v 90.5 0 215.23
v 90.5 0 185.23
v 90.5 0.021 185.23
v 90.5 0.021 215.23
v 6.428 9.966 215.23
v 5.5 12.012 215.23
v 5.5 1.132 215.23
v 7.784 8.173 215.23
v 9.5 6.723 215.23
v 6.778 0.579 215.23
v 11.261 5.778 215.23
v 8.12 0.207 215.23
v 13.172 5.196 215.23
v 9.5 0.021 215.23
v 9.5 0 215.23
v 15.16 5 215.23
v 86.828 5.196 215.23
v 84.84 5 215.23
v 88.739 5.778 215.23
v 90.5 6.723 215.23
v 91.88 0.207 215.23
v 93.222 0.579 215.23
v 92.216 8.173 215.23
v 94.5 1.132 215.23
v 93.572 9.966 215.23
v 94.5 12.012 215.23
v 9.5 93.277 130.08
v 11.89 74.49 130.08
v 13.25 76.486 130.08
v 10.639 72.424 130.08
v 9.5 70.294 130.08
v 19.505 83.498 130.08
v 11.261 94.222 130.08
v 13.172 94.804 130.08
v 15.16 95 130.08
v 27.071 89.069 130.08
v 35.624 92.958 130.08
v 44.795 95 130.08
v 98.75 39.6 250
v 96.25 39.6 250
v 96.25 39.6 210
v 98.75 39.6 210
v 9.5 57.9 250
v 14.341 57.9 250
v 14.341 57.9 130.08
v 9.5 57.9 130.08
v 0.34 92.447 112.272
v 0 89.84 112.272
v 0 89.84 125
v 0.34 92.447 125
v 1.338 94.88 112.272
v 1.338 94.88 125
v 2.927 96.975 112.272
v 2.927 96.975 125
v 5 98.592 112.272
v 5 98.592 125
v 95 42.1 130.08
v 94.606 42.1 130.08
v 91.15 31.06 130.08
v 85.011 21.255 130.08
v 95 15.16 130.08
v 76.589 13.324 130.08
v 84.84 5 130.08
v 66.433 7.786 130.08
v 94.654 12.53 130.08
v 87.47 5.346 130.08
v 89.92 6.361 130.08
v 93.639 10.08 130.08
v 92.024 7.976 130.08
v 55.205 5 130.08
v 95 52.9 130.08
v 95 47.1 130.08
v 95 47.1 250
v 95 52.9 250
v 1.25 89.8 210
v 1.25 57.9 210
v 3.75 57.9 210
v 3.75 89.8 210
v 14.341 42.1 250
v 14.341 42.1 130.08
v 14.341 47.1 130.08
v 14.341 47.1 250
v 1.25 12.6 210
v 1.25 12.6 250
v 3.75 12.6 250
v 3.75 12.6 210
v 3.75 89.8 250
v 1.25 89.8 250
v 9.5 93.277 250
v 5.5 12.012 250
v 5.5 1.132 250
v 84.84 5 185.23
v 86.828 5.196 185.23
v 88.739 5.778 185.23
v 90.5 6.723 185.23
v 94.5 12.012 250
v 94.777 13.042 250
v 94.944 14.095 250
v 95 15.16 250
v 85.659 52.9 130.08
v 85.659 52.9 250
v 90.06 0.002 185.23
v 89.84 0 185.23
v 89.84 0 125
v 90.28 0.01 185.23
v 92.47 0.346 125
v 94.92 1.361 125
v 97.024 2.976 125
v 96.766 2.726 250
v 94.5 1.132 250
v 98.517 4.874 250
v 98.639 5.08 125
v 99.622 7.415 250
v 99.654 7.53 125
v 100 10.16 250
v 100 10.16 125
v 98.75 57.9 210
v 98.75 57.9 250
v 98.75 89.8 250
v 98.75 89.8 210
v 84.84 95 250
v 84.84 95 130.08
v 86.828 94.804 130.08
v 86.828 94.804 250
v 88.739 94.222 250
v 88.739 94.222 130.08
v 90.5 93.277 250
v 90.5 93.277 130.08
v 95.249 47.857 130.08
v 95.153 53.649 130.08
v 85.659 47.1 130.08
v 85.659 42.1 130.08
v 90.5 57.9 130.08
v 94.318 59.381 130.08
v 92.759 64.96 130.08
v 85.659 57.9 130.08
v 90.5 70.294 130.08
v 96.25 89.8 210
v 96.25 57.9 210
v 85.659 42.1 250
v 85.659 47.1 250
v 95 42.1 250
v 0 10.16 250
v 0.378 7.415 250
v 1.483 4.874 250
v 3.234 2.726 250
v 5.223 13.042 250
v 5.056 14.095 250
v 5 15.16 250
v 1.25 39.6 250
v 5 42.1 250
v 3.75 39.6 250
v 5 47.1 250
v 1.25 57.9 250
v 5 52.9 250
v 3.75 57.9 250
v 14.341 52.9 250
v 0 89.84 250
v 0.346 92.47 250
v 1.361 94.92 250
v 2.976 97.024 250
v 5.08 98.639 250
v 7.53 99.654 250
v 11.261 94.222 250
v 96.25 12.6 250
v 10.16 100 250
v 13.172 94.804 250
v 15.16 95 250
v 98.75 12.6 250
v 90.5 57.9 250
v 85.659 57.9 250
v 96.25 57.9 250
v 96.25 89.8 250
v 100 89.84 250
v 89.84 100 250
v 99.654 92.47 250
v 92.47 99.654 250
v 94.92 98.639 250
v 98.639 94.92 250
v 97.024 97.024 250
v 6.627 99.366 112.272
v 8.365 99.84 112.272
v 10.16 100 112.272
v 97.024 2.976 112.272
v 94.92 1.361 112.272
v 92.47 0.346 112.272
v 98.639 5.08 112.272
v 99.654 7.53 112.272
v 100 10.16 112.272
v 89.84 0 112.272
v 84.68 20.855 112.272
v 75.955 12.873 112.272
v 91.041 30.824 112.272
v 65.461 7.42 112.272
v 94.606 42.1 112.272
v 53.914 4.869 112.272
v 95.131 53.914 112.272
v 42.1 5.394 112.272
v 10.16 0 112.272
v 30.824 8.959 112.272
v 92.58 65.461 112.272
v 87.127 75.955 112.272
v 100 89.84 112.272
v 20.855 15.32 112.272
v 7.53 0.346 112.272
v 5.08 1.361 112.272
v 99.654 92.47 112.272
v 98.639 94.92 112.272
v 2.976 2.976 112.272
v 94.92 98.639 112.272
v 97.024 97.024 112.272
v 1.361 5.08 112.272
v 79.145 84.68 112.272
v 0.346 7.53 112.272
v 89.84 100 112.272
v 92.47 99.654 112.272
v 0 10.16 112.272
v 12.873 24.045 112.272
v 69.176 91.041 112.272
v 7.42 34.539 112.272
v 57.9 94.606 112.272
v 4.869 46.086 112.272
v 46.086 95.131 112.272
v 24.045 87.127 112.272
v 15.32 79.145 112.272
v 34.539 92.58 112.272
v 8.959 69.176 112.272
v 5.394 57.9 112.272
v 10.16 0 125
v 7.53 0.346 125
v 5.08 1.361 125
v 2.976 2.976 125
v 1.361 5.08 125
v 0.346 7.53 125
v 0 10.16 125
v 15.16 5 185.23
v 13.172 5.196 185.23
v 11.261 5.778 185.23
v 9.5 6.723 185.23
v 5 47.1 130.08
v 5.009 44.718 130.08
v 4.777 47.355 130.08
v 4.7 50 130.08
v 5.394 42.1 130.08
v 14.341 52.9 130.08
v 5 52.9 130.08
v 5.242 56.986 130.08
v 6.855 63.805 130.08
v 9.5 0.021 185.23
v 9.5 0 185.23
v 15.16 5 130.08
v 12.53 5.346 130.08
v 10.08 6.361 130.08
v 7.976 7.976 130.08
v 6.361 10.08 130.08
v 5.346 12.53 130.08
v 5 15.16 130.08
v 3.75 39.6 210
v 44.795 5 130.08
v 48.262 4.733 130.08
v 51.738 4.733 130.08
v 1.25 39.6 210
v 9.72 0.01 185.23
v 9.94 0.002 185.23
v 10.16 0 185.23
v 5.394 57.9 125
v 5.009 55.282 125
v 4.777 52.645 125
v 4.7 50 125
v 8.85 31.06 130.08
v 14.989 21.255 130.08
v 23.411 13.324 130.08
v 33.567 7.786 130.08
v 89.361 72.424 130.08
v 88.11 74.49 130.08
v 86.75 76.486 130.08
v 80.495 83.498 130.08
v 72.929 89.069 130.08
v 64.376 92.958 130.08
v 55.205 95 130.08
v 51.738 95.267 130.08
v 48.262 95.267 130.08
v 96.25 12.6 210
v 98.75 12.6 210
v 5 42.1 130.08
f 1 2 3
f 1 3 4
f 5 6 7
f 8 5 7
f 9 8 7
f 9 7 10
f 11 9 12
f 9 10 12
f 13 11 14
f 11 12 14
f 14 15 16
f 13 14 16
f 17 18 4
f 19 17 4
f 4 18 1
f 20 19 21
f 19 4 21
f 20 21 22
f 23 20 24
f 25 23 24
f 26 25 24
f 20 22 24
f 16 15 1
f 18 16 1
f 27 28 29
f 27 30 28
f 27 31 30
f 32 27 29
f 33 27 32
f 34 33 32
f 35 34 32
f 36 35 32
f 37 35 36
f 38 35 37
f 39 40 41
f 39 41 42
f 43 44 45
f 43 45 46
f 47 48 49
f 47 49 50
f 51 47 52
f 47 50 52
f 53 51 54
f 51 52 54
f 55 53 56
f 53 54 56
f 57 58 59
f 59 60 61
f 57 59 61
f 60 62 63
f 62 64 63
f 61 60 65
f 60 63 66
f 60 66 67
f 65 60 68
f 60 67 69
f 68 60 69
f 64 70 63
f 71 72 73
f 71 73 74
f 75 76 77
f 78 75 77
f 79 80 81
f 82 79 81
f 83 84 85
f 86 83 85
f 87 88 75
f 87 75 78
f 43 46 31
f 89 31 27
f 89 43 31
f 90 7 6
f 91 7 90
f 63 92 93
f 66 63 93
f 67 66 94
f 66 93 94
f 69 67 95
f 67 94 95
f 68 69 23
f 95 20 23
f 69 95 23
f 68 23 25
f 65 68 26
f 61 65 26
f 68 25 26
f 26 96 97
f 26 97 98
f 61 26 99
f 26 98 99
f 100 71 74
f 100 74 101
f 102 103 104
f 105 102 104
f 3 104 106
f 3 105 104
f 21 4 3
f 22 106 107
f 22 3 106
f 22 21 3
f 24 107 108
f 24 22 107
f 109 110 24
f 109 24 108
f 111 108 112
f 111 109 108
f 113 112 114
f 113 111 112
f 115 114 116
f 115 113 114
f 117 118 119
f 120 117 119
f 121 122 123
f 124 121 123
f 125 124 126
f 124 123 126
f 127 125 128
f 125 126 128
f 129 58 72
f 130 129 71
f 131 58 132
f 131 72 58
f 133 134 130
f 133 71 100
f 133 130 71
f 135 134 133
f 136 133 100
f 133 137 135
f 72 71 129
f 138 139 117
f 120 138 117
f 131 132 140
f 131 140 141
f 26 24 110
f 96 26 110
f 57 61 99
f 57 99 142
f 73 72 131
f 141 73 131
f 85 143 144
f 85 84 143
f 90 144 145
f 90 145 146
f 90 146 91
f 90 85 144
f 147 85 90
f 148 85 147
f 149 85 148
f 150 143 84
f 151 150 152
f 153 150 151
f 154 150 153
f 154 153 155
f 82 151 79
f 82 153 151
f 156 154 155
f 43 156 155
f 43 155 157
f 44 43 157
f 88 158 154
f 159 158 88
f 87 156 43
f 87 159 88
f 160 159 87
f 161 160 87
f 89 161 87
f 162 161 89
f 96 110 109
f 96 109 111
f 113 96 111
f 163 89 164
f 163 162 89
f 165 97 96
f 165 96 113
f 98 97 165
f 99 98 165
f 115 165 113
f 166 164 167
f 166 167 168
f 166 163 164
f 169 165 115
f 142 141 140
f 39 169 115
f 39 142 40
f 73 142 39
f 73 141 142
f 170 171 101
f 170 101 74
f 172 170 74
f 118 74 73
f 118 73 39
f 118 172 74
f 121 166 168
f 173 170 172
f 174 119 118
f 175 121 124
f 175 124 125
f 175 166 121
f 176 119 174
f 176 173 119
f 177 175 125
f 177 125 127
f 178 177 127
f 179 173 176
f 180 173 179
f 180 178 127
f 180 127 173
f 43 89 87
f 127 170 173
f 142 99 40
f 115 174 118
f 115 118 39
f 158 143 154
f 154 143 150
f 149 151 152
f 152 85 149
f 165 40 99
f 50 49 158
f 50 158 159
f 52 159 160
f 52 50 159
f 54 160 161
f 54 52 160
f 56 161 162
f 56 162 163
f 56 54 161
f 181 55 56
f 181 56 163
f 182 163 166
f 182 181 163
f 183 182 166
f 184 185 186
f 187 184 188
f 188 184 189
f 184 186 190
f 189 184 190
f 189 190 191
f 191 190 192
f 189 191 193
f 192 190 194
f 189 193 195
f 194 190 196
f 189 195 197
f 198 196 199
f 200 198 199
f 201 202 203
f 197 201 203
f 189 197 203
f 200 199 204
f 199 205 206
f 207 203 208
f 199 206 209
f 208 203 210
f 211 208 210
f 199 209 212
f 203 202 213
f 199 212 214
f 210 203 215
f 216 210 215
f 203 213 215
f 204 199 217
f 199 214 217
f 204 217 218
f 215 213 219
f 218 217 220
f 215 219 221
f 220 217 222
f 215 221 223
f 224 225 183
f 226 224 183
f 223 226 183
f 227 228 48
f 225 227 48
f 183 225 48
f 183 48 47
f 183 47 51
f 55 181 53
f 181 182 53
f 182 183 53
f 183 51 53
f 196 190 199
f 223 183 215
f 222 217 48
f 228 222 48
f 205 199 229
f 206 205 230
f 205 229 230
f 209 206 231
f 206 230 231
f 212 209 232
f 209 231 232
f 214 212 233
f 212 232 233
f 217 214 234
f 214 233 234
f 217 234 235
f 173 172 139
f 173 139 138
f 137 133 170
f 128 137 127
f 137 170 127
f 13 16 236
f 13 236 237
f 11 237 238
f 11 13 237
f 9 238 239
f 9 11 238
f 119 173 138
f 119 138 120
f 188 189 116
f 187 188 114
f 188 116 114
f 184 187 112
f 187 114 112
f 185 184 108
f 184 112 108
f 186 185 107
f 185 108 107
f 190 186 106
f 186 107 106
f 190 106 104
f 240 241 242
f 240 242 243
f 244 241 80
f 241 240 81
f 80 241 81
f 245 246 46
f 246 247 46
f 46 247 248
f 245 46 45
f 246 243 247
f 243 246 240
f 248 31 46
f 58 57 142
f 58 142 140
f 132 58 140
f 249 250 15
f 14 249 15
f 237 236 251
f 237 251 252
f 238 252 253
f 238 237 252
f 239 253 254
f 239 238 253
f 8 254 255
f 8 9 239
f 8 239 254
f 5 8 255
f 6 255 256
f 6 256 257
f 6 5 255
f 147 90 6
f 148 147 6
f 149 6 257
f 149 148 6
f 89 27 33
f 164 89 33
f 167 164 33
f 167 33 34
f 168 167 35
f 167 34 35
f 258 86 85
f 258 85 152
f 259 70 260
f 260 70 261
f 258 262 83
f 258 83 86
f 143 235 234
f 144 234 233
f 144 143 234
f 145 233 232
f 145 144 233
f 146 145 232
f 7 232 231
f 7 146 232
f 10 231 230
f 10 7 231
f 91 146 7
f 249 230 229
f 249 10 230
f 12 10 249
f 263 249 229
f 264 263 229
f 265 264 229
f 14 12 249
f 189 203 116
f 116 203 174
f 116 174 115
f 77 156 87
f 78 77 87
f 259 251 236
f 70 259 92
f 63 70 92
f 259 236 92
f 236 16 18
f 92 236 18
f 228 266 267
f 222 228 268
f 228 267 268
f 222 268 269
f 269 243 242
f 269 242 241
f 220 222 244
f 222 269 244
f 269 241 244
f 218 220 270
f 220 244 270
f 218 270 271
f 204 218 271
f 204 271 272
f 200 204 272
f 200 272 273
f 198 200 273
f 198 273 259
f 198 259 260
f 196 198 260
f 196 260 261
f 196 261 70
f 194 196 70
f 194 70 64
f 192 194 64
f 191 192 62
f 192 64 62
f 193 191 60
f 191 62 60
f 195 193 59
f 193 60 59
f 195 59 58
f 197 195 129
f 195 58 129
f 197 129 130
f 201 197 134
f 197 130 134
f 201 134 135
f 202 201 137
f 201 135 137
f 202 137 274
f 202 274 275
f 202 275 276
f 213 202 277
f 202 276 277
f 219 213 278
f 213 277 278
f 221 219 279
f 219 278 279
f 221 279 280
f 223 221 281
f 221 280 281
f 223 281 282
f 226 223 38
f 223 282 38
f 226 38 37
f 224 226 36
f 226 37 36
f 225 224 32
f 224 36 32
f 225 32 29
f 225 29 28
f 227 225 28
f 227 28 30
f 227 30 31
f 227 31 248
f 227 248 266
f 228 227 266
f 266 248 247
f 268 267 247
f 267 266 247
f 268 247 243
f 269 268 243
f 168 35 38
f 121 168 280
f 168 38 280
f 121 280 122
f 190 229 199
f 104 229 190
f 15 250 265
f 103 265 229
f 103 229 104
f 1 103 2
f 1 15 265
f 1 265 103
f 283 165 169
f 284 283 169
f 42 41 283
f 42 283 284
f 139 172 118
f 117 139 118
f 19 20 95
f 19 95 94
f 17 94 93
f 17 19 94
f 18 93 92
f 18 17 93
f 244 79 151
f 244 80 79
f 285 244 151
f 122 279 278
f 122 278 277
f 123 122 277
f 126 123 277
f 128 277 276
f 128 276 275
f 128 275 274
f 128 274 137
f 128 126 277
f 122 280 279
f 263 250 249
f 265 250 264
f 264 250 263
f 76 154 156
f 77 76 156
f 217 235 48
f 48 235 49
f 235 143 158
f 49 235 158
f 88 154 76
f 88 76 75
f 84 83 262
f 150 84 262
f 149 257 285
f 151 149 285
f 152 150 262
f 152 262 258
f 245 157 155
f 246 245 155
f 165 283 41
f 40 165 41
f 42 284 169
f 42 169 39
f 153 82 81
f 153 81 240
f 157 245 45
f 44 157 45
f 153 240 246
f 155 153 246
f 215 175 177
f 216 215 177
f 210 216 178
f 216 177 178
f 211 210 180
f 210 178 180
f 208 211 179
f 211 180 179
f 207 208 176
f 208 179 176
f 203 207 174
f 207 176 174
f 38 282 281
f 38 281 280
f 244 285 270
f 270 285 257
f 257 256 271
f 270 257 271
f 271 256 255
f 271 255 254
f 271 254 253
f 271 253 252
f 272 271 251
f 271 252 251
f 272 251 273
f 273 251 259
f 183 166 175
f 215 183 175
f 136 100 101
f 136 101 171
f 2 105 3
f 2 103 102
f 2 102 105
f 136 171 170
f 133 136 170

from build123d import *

# Parameters (mm, degrees)
SKETCH1_W                = 100
SKETCH1_H                = 100
BOSS_EXTRUDE1_DEPTH      = 250
SKETCH2_W                = 90
SKETCH2_H                = 90
CUT_EXTRUDE1_DEPTH       = 288.228132327
FILLET1_R                = 10.16
SKETCH3_W                = 9.3412
SKETCH3_H                = 5
BOSS_EXTRUDE2_DEPTH      = 250
SKETCH4_W                = 100
SKETCH4_H                = 125
CUT_EXTRUDE2_DEPTH       = 288.228132327
SKETCH6_W                = 90
SKETCH6_H                = 5.08
BOSS_EXTRUDE3_DEPTH      = 95
SKETCH7_R                = 45.3
CUT_EXTRUDE4_DEPTH       = 5.08
SKETCH10_R               = 48.300000047
BOSS_EXTRUDE4_DEPTH      = 30
SKETCH11_R               = 45.3
CUT_EXTRUDE5_DEPTH       = 30
SKETCH13_W               = 63.5
SKETCH13_H               = 63.5
CUT_EXTRUDE7_DEPTH       = 5
FILLET4_R                = 1.27
FILLET5_R                = 10.16
BOSS_EXTRUDE6_DEPTH      = 30
SKETCH16_R               = 45.3
CUT_EXTRUDE8_DEPTH       = 189.745860882
CUT_EXTRUDE10_DEPTH      = 210.821352584
SKETCH19_W               = 81
SKETCH19_H               = 64.77
CUT_EXTRUDE11_DEPTH      = 25.4
SKETCH20_W               = 81
SKETCH20_H               = 32.5
BOSS_EXTRUDE7_DEPTH      = 5
BOSS_EXTRUDE8_START      = 32.5
BOSS_EXTRUDE8_DEPTH      = 32.5
BOSS_EXTRUDE10_DEPTH     = 119.92
SKETCH25_W               = 73.5
SKETCH25_H               = 16.413635584
BOSS_EXTRUDE11_DEPTH     = 6.35
SKETCH26_W               = 17.272
SKETCH26_H               = 100
CUT_EXTRUDE12_DEPTH      = 132
SKETCH28_W               = 81
SKETCH28_H               = 37.9
CUT_EXTRUDE13_DEPTH      = 113.57
SKETCH29_W               = 2.5
SKETCH29_H               = 31.9
SKETCH29_H_2             = 27
CUT_EXTRUDE14_DEPTH      = 40
CUT_EXTRUDE15_DEPTH      = 198.405678703
CUT_EXTRUDE15_DEPTH_BACK = 119.92
SKETCH30_W               = 90
SKETCH30_H               = 37.9
BOSS_EXTRUDE12_DEPTH     = 119.92
CUT_EXTRUDE16_REACH      = 289.228
SKETCH33_W               = 89
SKETCH33_H               = 34.77
SKETCH35_W               = 4.5
SKETCH35_H               = 38.1
BOSS_EXTRUDE14_DEPTH     = 119.92


with BuildPart() as part:
    # Sketch1 → Boss-Extrude1 (new body)
    with BuildSketch(Plane.XY):
        with Locations((50, 50)):
            Rectangle(SKETCH1_W, SKETCH1_H)
    extrude(amount=BOSS_EXTRUDE1_DEPTH)

    # Sketch2 → Cut-Extrude1 (cut, through all)
    with BuildSketch(Plane(origin=(0, 0, 0), x_dir=(-1, 0, 0), z_dir=(0, 0, -1))):
        with Locations((-50, 50)):
            Rectangle(SKETCH2_W, SKETCH2_H)
    extrude(amount=-CUT_EXTRUDE1_DEPTH, mode=Mode.SUBTRACT)

    # Fillet1
    fillet1_edges = [part.edges().sort_by_distance(p)[0] for p in [
        (0, 100, 125),
        (0, 0, 125),
        (100, 0, 125),
        (100, 100, 125),
    ]]
    fillet(fillet1_edges, radius=FILLET1_R)

    # Sketch3 → Boss-Extrude2 (add, through all)
    with BuildSketch(Plane(origin=(0, 0, 0), x_dir=(-1, 0, 0), z_dir=(0, 0, -1))):
        with Locations((-90.3294, 55.4)):
            Rectangle(SKETCH3_W, SKETCH3_H)
        with Locations((-90.3294, 44.6)):
            Rectangle(SKETCH3_W, SKETCH3_H)
        with Locations((-9.6706, 44.6)):
            Rectangle(SKETCH3_W, SKETCH3_H)
        with Locations((-9.6706, 55.4)):
            Rectangle(SKETCH3_W, SKETCH3_H)
    extrude(amount=-BOSS_EXTRUDE2_DEPTH)

    # Sketch4 → Cut-Extrude2 (cut, through all)
    with BuildSketch(Plane(origin=(0, 100, 0), x_dir=(1, 0, 0), z_dir=(0, 1, 0))):
        with Locations((50, -62.5)):
            Rectangle(SKETCH4_W, SKETCH4_H)
    extrude(amount=-CUT_EXTRUDE2_DEPTH, mode=Mode.SUBTRACT)

    # Sketch6 → Boss-Extrude3 (add)
    with BuildSketch(Plane(origin=(0, 5, 0), x_dir=(1, 0, 0), z_dir=(0, 1, 0))):
        with Locations((50, -127.54)):
            Rectangle(SKETCH6_W, SKETCH6_H)
    extrude(amount=BOSS_EXTRUDE3_DEPTH)

    # Sketch7 → Cut-Extrude4 (cut)
    with BuildSketch(Plane(origin=(0, 0, 125), x_dir=(-1, 0, 0), z_dir=(0, 0, -1))):
        with Locations((-50, 50)):
            Circle(SKETCH7_R)
    extrude(amount=-CUT_EXTRUDE4_DEPTH, mode=Mode.SUBTRACT)

    # Sketch10 → Boss-Extrude4 (add)
    with BuildSketch(Plane(origin=(0, 0, 125), x_dir=(-1, 0, 0), z_dir=(0, 0, -1))):
        with Locations(Location((-50, 50, 0), (0, 0, 180))):
            Circle(SKETCH10_R)
    extrude(amount=BOSS_EXTRUDE4_DEPTH)

    # Sketch11 → Cut-Extrude5 (cut)
    with BuildSketch(Plane(origin=(0, 0, 95), x_dir=(-1, 0, 0), z_dir=(0, 0, -1))):
        with Locations((-50, 50)):
            Circle(SKETCH11_R)
    extrude(amount=-CUT_EXTRUDE5_DEPTH, mode=Mode.SUBTRACT)

    # Sketch13 → Cut-Extrude7 (cut)
    with BuildSketch(Plane.XZ):
        with Locations((50, 218.25)):
            Rectangle(SKETCH13_W, SKETCH13_H)
    extrude(amount=-CUT_EXTRUDE7_DEPTH, mode=Mode.SUBTRACT)

    # Fillet4
    fillet4_edges = [part.edges().sort_by_distance(p)[0] for p in [
        (81.75, 0, 218.25),
        (18.25, 0, 218.25),
        (50, 0, 186.5),
    ]]
    fillet(fillet4_edges, radius=FILLET4_R)

    # Fillet5
    fillet5_edges = [part.edges().sort_by_distance(p)[0] for p in [
        (95, 95, 190.04),
        (5, 95, 190.04),
        (5, 5, 190.04),
        (95, 5, 190.04),
    ]]
    fillet(fillet5_edges, radius=FILLET5_R)

    # Sketch14 → Boss-Extrude6 (add)
    with BuildSketch(Plane(origin=(0, 0, 125), x_dir=(-1, 0, 0), z_dir=(0, 0, -1))):
        with BuildLine():
            Line((-5, 100), (-95, 100))
            Line((-95, 100), (-95, 98.592142595))
            ThreePointArc((-95, 98.592142595), (-98.661881885, 94.879841267), (-100, 89.84))
            Line((-100, 89.84), (-100, 10.16))
            ThreePointArc((-100, 10.16), (-97.024204897, 2.975795103), (-89.84, 0))
            Line((-89.84, 0), (-10.16, 0))
            ThreePointArc((-10.16, 0), (-2.975795103, 2.975795103), (0, 10.16))
            Line((0, 10.16), (0, 89.84))
            ThreePointArc((0, 89.84), (-1.338118115, 94.879841267), (-5, 98.592142595))
            Line((-5, 98.592142595), (-5, 100))
        make_face()
    extrude(amount=BOSS_EXTRUDE6_DEPTH)

    # Sketch16 → Cut-Extrude8 (cut, through all)
    with BuildSketch(Plane.XY.offset(125)):
        with Locations(Location((50, 50, 0), (0, 0, 169.956667322))):
            Circle(SKETCH16_R)
    extrude(amount=-CUT_EXTRUDE8_DEPTH, mode=Mode.SUBTRACT)

    # Sketch18 → Cut-Extrude10 (cut, through all)
    with BuildSketch(Plane(origin=(0, 0, 95), x_dir=(-1, 0, 0), z_dir=(0, 0, -1))):
        with BuildLine():
            Line((-100, 89.84), (-100, 107.62))
            Line((-100, 107.62), (0, 107.62))
            Line((0, 107.62), (0, 89.84))
            ThreePointArc((0, 89.84), (-2.975795103, 97.024204897), (-10.16, 100))
            Line((-10.16, 100), (-89.84, 100))
            ThreePointArc((-89.84, 100), (-97.024204897, 97.024204897), (-100, 89.84))
        make_face()
    extrude(amount=-CUT_EXTRUDE10_DEPTH, mode=Mode.SUBTRACT)

    # Sketch19 → Cut-Extrude11 (cut)
    with BuildSketch(Plane.XZ):
        with Locations((50, 217.615)):
            Rectangle(SKETCH19_W, SKETCH19_H)
    extrude(amount=-CUT_EXTRUDE11_DEPTH, mode=Mode.SUBTRACT)

    # Sketch20 → Boss-Extrude7 (add)
    with BuildSketch(Plane.XZ):
        with Locations((50, 201.48)):
            Rectangle(SKETCH20_W, SKETCH20_H)
    extrude(amount=-BOSS_EXTRUDE7_DEPTH)

    # Sketch21 → Boss-Extrude8 (add)
    with BuildSketch(Plane.XY.offset(185.23).offset(BOSS_EXTRUDE8_START)):
        with BuildLine():
            Line((9.5, 5), (15.16, 5))
            ThreePointArc((15.16, 5), (12.201837845, 5.440181243), (9.5, 6.722583334))
            Line((9.5, 6.722583334), (9.5, 5))
        make_face()
        with BuildLine():
            ThreePointArc((90.5, 6.722583334), (87.798162155, 5.440181243), (84.84, 5))
            Line((84.84, 5), (90.5, 5))
            Line((90.5, 5), (90.5, 6.722583334))
        make_face()
    extrude(amount=-BOSS_EXTRUDE8_DEPTH)

    # Sketch24 → Boss-Extrude10 (add)
    with BuildSketch(Plane.XY.offset(130.08)):
        Polygon((95, 57.9), (86.75, 57.9), (86.75, 92.9), (13.25, 92.9), (13.25, 57.9), (5, 57.9), (5, 95), (95, 95), align=None)
    extrude(amount=BOSS_EXTRUDE10_DEPTH)

    # Sketch25 → Boss-Extrude11 (add)
    with BuildSketch(Plane.XY.offset(130.08)):
        with Locations((50, 84.693182208)):
            Rectangle(SKETCH25_W, SKETCH25_H)
    extrude(amount=BOSS_EXTRUDE11_DEPTH)

    # Sketch26 → Cut-Extrude12 (cut)
    with BuildSketch(Plane.ZY):
        with Locations((103.636, 50)):
            Rectangle(SKETCH26_W, SKETCH26_H)
    extrude(amount=-CUT_EXTRUDE12_DEPTH, mode=Mode.SUBTRACT)

    # Sketch28 → Cut-Extrude13 (cut)
    with BuildSketch(Plane.XY.offset(250)):
        with Locations((50, 76.85)):
            Rectangle(SKETCH28_W, SKETCH28_H)
    extrude(amount=-CUT_EXTRUDE13_DEPTH, mode=Mode.SUBTRACT)

    # Sketch29 → Cut-Extrude14 (cut)
    with BuildSketch(Plane.XY.offset(250)):
        with Locations((2.5, 73.85)):
            Rectangle(SKETCH29_W, SKETCH29_H)
        with Locations((2.5, 26.1)):
            Rectangle(SKETCH29_W, SKETCH29_H_2)
        with Locations((97.5, 26.1)):
            Rectangle(SKETCH29_W, SKETCH29_H_2)
        with Locations((97.5, 73.85)):
            Rectangle(SKETCH29_W, SKETCH29_H)
    extrude(amount=-CUT_EXTRUDE14_DEPTH, mode=Mode.SUBTRACT)

    # Sketch30 → Cut-Extrude15 (cut, two sides: drawn at the far end of the back side and taken through both)
    with BuildSketch(Plane.XY.offset(250).offset(-CUT_EXTRUDE15_DEPTH_BACK)):
        with Locations((50, 76.85)):
            Rectangle(SKETCH30_W, SKETCH30_H)
    extrude(amount=CUT_EXTRUDE15_DEPTH + CUT_EXTRUDE15_DEPTH_BACK, mode=Mode.SUBTRACT)

    # Sketch32 → Boss-Extrude12 (add)
    with BuildSketch(Plane.XY.offset(130.08)):
        with BuildLine():
            Line((15.16, 95), (84.84, 95))
            ThreePointArc((84.84, 95), (92.024204897, 92.024204897), (95, 84.84))
            Line((95, 84.84), (95, 95.8))
            Line((95, 95.8), (5, 95.8))
            Line((5, 95.8), (5, 84.84))
            ThreePointArc((5, 84.84), (7.975795103, 92.024204897), (15.16, 95))
        make_face()
    extrude(amount=BOSS_EXTRUDE12_DEPTH)

    # Cut-Extrude16: up to this face of the body (flat: up to its plane)
    cut_extrude16_end = Plane(part.part.faces().sort_by_distance((9.6706, 42.1, 190.04))[0])
    # Sketch33 → Cut-Extrude16 (cut, up to the picked face)
    with BuildSketch(Plane.XZ, mode=Mode.PRIVATE) as cut_extrude16_sk1:
        with Locations((50, 232.615)):
            Rectangle(SKETCH33_W, SKETCH33_H)
    cut_extrude16_tool1 = split(extrude(cut_extrude16_sk1.sketch, amount=-CUT_EXTRUDE16_REACH, mode=Mode.PRIVATE), bisect_by=cut_extrude16_end, keep=Keep.BOTH, mode=Mode.PRIVATE)
    add(cut_extrude16_tool1.solids().sort_by(Axis((50, 0, 232.615), (0, 1, 0)))[0], mode=Mode.SUBTRACT)

    # Sketch35 → Boss-Extrude14 (add)
    with BuildSketch(Plane.XY.offset(250)):
        with Locations((7.25, 76.95)):
            Rectangle(SKETCH35_W, SKETCH35_H)
        with Locations((92.75, 76.95)):
            Rectangle(SKETCH35_W, SKETCH35_H)
    extrude(amount=-BOSS_EXTRUDE14_DEPTH)


solid = part.part
